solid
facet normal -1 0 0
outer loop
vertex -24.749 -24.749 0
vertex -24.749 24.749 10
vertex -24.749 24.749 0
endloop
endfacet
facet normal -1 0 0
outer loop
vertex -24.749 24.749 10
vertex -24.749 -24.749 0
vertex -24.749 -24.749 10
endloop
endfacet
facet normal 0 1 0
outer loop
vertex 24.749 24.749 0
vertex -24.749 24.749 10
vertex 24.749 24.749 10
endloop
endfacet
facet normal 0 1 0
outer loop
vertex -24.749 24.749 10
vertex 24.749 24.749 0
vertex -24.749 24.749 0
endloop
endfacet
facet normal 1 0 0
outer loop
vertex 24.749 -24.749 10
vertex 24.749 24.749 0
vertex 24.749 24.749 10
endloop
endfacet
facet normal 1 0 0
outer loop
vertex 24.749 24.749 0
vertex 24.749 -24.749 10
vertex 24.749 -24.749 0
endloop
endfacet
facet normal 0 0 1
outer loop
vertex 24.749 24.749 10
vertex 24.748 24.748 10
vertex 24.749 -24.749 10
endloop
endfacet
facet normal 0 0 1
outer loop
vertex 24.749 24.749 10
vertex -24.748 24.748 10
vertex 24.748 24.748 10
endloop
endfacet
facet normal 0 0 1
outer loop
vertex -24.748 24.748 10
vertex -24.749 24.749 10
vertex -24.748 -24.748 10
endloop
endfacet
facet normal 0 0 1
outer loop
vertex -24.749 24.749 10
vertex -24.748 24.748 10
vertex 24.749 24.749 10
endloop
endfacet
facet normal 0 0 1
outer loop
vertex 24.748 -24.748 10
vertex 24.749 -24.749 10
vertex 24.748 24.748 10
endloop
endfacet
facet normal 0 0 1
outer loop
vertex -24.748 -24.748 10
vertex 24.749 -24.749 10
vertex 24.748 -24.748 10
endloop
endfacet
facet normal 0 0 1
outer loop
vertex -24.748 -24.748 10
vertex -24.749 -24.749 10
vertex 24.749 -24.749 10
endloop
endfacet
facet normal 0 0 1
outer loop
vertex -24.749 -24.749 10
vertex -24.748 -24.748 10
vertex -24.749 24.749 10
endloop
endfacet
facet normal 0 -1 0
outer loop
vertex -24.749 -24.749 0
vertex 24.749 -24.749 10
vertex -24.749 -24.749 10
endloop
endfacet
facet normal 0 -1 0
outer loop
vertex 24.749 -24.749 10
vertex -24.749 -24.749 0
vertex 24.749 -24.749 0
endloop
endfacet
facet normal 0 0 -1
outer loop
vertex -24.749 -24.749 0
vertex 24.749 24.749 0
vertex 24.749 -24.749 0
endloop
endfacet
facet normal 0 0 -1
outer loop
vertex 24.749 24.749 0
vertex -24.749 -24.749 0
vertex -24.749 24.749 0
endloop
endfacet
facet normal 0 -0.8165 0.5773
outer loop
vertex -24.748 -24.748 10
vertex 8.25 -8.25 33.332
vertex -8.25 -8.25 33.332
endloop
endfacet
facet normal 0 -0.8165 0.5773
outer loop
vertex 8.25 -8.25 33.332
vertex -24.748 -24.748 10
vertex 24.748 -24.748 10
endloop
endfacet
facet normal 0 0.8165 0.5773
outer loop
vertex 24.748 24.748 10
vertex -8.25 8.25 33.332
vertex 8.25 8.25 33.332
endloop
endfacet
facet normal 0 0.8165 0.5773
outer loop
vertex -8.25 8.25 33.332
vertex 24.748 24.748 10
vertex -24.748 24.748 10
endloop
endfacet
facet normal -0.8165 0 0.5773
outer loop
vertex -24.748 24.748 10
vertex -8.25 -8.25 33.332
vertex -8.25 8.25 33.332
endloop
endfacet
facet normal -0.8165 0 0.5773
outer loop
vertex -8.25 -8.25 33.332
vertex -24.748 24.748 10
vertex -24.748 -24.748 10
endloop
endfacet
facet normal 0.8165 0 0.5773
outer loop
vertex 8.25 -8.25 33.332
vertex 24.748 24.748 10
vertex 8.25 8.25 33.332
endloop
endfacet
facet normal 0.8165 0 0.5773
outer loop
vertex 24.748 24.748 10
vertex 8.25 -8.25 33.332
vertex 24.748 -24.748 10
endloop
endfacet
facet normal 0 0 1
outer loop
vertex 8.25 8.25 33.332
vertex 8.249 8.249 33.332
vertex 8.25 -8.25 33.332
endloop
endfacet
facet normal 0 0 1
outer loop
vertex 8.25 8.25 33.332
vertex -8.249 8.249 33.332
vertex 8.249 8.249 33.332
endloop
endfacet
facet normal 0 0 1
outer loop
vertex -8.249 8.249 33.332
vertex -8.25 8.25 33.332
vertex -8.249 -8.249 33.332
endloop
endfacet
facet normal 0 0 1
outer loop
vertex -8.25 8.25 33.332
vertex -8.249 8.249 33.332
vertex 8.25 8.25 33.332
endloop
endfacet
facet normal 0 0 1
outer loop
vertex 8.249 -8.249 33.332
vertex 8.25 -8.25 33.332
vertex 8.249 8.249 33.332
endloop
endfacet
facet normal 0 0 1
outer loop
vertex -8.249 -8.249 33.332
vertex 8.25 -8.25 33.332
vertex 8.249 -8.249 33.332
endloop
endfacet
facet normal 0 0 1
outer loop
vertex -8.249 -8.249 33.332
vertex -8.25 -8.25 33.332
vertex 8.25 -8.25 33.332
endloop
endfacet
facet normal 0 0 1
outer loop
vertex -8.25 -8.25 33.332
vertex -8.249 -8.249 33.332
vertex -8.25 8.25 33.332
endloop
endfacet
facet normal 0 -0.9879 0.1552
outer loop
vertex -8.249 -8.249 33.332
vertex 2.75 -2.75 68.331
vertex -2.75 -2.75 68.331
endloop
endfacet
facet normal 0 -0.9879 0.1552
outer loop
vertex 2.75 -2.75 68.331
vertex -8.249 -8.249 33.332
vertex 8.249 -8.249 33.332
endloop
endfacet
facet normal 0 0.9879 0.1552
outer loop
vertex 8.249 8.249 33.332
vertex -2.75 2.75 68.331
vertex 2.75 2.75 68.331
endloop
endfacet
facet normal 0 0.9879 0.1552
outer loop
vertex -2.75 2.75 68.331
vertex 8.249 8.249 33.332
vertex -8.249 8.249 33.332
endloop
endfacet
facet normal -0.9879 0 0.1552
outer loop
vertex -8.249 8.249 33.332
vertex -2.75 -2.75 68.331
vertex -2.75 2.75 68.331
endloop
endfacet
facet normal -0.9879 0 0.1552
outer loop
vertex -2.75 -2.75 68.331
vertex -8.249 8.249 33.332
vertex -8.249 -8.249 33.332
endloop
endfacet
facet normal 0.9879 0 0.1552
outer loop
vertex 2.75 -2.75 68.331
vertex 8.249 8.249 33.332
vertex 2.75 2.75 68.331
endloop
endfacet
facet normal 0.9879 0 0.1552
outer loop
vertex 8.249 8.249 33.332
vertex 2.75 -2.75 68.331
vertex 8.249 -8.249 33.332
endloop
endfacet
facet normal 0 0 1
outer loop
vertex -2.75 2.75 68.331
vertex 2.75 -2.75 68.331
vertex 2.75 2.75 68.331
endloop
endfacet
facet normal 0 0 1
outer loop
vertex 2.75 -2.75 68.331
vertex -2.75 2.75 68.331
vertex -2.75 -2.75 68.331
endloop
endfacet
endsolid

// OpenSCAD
// This makes use of the $fn function to limit the number of facets (sides) of cylinders.
// So essentially this is just a cylinder with a couple of cones stacked on top.
// Setting $fn to 3 gives a 3 sided funnel (triangular) funnel.
// Setting $fn to 4 gives a 4 sided (square) funnel.
// etc. The higher the number, the more "round" it becomes.

// REALLY IMPORTANT. THE STL PRODUCES A SOLID OBJECT WHICH WON'T BE MUCH USE AS A FUNNEL. 
// TO MAKE THIS WORK, YOU NEED TO SLICE IT WITH NO TOP AND BOTTOM LAYERS, NO INFILL, BUT 3 OR 4 PERIMETERS.
// THAT WILL PRODUCE A G-CODE WHICH WILL MAKE A HOLLOW FUNNEL.


// Number of sides. 3 makes a trangular funnel, 4 makes a square funnel, 5 would be pentagonal, etc
Number_Of_Sides = 4;

$fn=Number_Of_Sides;

// Width across corners . NOTE this is the width across the corners, not across the flats. 
// Essentialy, the width is the diameter of a circle within which your funnel will fit.
// So for example, if you want a 4 sided cone that is 100 mm across flats, you will need 
// to set the width to approximately 1.4 times greater - i.e. 140mm.

Width_Across_Corners = 70;

dia1=Width_Across_Corners;


// If you want, you can change the proportions by playing around with the following variables.


dia2=dia1/3;
dia3=dia2/3;
h1=dia1/7;
h2=dia1/3;
h3=dia1/2;


// This is the main code section

rotate ([0,0,45])
cylinder (d=dia1, h=h1);
rotate ([0,0,45])
translate ([0,0,(h1-.001)]) // Set the z axis starting point very slightly lower to ensure that it is manifold 
cylinder (d1=dia1, d2=dia2, h= h2);
rotate ([0,0,45])
translate ([0,0,(h1+h2-.002)]) // As above comment.
cylinder (d1=dia2, d2=dia3, h= h3);

